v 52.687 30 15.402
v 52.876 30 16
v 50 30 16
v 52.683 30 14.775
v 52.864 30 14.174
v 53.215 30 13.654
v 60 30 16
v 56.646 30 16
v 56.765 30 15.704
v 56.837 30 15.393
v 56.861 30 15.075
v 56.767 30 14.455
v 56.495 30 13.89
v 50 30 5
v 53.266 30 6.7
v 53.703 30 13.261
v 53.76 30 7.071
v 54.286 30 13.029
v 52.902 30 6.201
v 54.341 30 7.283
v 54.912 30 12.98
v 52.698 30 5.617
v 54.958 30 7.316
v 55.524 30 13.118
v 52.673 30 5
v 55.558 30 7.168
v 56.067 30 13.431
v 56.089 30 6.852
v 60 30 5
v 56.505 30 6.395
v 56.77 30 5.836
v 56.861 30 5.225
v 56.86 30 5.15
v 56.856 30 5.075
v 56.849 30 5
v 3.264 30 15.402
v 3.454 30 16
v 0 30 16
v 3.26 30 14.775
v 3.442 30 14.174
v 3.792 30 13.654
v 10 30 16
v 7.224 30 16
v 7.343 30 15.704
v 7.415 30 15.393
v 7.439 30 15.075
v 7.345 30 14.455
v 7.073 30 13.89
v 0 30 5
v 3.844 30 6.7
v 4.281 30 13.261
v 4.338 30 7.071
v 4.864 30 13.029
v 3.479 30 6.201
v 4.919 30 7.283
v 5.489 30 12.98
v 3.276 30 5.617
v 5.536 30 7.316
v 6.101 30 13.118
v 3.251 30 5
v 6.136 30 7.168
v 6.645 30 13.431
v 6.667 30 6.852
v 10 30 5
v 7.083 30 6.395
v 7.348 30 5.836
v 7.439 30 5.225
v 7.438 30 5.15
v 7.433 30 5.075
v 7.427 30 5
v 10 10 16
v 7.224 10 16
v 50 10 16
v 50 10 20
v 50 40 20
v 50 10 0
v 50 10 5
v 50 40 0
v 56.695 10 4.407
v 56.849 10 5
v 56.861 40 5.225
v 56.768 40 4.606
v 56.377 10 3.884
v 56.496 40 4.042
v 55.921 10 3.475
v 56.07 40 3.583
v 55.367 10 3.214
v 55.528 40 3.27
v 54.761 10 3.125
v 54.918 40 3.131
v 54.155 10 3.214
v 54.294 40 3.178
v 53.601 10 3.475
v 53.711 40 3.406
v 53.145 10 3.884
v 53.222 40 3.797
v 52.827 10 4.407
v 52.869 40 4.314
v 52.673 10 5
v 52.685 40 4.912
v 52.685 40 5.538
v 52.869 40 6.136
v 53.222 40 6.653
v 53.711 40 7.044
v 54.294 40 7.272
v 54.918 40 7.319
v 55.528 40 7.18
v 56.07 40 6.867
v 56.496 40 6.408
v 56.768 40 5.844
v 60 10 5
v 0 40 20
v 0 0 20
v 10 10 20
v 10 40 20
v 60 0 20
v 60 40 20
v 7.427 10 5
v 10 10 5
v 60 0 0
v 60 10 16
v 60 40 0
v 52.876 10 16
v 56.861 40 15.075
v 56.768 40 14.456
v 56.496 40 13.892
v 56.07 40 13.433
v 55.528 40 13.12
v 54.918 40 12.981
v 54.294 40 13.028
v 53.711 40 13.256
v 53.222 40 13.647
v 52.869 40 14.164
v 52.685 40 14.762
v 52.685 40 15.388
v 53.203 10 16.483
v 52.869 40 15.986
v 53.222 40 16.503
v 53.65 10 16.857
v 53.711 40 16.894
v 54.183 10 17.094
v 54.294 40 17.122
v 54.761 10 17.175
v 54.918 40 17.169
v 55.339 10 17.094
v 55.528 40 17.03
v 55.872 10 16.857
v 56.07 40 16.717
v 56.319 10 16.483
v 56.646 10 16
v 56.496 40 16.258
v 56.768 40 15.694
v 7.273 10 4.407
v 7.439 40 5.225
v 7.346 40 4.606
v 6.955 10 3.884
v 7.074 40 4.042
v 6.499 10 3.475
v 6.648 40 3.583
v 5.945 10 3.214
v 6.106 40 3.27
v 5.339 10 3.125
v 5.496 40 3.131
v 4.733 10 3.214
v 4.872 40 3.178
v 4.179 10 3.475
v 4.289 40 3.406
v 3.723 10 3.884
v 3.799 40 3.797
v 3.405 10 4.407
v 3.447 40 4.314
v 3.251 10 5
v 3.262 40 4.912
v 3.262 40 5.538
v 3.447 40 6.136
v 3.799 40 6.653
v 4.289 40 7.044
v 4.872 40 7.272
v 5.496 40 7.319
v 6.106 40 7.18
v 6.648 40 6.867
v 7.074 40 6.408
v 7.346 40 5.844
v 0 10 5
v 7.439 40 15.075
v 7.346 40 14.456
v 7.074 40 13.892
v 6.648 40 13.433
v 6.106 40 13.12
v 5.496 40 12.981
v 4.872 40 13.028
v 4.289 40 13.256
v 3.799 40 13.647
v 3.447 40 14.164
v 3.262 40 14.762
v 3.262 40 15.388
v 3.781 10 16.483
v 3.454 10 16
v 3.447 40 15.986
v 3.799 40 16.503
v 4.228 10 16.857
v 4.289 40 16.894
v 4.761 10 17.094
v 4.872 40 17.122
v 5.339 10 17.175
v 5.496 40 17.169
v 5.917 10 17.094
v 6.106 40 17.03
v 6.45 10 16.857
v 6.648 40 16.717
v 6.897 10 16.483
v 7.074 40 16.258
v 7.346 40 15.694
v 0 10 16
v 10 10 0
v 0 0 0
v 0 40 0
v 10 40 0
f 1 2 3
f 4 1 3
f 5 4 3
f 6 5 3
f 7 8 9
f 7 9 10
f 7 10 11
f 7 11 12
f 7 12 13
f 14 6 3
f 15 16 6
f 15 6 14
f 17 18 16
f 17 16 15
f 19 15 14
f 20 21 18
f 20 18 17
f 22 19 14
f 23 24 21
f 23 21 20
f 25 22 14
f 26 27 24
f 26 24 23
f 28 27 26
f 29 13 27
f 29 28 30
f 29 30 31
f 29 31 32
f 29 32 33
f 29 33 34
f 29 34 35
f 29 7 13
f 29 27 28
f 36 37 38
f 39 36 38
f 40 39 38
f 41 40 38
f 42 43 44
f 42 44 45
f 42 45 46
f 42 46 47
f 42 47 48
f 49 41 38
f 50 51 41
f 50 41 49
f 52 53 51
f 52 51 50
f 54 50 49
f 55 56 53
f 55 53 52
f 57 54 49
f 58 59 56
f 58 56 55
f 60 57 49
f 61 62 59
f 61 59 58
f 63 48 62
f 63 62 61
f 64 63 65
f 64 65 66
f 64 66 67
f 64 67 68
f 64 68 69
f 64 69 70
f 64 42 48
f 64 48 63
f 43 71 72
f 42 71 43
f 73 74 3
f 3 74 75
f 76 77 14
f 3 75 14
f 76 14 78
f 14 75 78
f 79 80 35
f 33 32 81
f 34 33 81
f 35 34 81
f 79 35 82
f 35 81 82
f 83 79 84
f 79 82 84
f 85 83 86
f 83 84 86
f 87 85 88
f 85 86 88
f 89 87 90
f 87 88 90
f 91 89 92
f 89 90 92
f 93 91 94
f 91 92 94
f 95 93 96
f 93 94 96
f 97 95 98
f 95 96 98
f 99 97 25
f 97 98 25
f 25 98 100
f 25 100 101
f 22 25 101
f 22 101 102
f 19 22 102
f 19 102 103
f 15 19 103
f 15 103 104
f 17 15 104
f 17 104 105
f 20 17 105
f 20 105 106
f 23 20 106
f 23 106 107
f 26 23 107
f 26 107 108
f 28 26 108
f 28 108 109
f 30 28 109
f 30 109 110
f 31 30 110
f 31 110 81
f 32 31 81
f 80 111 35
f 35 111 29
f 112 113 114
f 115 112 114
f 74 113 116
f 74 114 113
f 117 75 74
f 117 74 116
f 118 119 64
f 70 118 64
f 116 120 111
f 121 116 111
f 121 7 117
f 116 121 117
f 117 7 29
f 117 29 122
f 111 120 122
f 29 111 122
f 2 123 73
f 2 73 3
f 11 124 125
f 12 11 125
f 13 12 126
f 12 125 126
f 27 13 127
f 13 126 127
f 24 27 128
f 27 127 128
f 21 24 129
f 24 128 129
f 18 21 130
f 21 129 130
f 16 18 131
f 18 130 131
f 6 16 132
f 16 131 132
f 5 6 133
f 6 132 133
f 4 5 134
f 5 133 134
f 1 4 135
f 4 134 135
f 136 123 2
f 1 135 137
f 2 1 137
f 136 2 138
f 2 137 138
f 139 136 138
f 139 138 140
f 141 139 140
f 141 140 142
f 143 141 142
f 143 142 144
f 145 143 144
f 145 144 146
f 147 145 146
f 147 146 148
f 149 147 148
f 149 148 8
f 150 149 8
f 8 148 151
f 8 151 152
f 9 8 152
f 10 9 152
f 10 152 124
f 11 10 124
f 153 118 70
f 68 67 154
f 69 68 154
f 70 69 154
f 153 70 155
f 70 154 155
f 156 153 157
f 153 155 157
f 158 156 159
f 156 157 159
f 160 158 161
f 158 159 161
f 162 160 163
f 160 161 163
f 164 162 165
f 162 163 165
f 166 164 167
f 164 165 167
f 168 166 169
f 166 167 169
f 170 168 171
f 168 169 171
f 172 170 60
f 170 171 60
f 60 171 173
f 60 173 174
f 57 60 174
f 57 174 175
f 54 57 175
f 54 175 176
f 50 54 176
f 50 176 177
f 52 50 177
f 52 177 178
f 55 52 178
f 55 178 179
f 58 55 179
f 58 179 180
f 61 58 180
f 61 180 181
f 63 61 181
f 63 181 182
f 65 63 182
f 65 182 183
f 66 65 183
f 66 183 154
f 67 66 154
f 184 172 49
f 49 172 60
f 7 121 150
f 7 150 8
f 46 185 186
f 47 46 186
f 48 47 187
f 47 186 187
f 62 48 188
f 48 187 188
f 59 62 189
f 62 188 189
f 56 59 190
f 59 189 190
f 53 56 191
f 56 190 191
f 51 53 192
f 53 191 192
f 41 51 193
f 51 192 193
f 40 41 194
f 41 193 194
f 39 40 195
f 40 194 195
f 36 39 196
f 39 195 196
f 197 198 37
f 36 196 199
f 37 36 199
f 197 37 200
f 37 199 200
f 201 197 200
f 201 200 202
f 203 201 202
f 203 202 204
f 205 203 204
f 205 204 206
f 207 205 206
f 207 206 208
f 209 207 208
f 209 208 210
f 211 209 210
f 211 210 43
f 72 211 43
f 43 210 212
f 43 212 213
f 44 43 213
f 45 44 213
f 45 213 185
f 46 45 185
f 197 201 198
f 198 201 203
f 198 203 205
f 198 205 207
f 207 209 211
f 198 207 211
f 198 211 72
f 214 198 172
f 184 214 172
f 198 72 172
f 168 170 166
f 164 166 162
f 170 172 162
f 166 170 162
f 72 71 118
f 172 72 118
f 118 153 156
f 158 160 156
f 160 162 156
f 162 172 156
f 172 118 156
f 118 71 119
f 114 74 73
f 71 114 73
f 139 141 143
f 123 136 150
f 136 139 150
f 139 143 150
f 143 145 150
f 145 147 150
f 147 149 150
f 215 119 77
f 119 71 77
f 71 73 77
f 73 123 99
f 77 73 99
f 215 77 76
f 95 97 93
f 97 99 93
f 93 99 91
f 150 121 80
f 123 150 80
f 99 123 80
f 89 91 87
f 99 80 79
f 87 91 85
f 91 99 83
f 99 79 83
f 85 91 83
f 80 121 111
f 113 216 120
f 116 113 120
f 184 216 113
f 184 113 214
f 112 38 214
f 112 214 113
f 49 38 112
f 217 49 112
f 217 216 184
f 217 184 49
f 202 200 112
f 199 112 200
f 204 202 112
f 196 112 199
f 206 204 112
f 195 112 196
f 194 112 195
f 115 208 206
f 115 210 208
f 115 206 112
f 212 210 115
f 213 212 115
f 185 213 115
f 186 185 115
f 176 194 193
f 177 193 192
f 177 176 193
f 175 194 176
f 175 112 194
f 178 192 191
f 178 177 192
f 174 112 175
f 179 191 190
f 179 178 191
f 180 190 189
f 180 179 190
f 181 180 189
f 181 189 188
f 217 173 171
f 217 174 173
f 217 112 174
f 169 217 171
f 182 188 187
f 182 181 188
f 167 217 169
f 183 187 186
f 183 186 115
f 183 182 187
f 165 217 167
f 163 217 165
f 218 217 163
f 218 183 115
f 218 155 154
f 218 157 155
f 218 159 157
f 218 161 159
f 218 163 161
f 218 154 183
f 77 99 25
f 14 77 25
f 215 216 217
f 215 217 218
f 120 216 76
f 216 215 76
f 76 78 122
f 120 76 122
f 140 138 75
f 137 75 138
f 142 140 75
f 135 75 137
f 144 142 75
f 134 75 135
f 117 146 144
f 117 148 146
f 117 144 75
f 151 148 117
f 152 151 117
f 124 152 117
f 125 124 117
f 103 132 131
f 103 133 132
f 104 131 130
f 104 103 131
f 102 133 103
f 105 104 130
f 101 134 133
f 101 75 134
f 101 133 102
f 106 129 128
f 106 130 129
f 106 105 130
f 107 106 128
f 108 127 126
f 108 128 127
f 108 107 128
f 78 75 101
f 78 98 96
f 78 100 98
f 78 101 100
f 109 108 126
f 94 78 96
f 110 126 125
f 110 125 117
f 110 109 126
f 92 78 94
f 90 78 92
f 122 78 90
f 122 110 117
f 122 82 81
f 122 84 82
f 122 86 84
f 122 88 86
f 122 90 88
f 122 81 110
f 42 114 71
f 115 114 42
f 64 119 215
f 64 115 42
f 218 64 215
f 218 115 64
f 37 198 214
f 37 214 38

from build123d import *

# Parameters (mm, degrees)
SKIZZE1_W                       = 60
SKIZZE1_H                       = 40
AUFSATZ_LINEAR_AUSTRAGEN1_DEPTH = 20
SKIZZE2_W                       = 40
SKIZZE2_H                       = 20
SCHNITT_LINEAR_AUSTRAGEN1_DEPTH = 30
SKIZZE3_W                       = 11
SKIZZE3_H                       = 20
SCHNITT_LINEAR_AUSTRAGEN2_DEPTH = 61
SKIZZE4_R                       = 2.1
SCHNITT_LINEAR_AUSTRAGEN3_DEPTH = 30


with BuildPart() as part:
    # Skizze1 → Aufsatz-Linear austragen1 (new body)
    with BuildSketch(Plane.XY):
        with Locations((30, 20)):
            Rectangle(SKIZZE1_W, SKIZZE1_H)
    extrude(amount=AUFSATZ_LINEAR_AUSTRAGEN1_DEPTH)

    # Skizze2 → Schnitt-Linear austragen1 (cut)
    with BuildSketch(Plane(origin=(0, 40, 0), x_dir=(1, 0, 0), z_dir=(0, 1, 0))):
        with Locations((30, -10)):
            Rectangle(SKIZZE2_W, SKIZZE2_H)
    extrude(amount=-SCHNITT_LINEAR_AUSTRAGEN1_DEPTH, mode=Mode.SUBTRACT)

    # Skizze3 → Schnitt-Linear austragen2 (cut, through all)
    with BuildSketch(Plane(origin=(60, 0, 0), x_dir=(0, 0, -1), z_dir=(1, 0, 0))):
        with Locations((-10.5, 20)):
            Rectangle(SKIZZE3_W, SKIZZE3_H)
    extrude(amount=-SCHNITT_LINEAR_AUSTRAGEN2_DEPTH, mode=Mode.SUBTRACT)

    # Skizze4 → Schnitt-Linear austragen3 (cut)
    with BuildSketch(Plane(origin=(0, 40, 0), x_dir=(1, 0, 0), z_dir=(0, 1, 0))):
        with Locations((5.338854382, -5.225)):
            Circle(SKIZZE4_R)
        with Locations((5.338854382, -15.075)):
            Circle(SKIZZE4_R)
        with Locations((54.761145618, -15.075)):
            Circle(SKIZZE4_R)
        with Locations((54.761145618, -5.225)):
            Circle(SKIZZE4_R)
    extrude(amount=-SCHNITT_LINEAR_AUSTRAGEN3_DEPTH, mode=Mode.SUBTRACT)


solid = part.part
